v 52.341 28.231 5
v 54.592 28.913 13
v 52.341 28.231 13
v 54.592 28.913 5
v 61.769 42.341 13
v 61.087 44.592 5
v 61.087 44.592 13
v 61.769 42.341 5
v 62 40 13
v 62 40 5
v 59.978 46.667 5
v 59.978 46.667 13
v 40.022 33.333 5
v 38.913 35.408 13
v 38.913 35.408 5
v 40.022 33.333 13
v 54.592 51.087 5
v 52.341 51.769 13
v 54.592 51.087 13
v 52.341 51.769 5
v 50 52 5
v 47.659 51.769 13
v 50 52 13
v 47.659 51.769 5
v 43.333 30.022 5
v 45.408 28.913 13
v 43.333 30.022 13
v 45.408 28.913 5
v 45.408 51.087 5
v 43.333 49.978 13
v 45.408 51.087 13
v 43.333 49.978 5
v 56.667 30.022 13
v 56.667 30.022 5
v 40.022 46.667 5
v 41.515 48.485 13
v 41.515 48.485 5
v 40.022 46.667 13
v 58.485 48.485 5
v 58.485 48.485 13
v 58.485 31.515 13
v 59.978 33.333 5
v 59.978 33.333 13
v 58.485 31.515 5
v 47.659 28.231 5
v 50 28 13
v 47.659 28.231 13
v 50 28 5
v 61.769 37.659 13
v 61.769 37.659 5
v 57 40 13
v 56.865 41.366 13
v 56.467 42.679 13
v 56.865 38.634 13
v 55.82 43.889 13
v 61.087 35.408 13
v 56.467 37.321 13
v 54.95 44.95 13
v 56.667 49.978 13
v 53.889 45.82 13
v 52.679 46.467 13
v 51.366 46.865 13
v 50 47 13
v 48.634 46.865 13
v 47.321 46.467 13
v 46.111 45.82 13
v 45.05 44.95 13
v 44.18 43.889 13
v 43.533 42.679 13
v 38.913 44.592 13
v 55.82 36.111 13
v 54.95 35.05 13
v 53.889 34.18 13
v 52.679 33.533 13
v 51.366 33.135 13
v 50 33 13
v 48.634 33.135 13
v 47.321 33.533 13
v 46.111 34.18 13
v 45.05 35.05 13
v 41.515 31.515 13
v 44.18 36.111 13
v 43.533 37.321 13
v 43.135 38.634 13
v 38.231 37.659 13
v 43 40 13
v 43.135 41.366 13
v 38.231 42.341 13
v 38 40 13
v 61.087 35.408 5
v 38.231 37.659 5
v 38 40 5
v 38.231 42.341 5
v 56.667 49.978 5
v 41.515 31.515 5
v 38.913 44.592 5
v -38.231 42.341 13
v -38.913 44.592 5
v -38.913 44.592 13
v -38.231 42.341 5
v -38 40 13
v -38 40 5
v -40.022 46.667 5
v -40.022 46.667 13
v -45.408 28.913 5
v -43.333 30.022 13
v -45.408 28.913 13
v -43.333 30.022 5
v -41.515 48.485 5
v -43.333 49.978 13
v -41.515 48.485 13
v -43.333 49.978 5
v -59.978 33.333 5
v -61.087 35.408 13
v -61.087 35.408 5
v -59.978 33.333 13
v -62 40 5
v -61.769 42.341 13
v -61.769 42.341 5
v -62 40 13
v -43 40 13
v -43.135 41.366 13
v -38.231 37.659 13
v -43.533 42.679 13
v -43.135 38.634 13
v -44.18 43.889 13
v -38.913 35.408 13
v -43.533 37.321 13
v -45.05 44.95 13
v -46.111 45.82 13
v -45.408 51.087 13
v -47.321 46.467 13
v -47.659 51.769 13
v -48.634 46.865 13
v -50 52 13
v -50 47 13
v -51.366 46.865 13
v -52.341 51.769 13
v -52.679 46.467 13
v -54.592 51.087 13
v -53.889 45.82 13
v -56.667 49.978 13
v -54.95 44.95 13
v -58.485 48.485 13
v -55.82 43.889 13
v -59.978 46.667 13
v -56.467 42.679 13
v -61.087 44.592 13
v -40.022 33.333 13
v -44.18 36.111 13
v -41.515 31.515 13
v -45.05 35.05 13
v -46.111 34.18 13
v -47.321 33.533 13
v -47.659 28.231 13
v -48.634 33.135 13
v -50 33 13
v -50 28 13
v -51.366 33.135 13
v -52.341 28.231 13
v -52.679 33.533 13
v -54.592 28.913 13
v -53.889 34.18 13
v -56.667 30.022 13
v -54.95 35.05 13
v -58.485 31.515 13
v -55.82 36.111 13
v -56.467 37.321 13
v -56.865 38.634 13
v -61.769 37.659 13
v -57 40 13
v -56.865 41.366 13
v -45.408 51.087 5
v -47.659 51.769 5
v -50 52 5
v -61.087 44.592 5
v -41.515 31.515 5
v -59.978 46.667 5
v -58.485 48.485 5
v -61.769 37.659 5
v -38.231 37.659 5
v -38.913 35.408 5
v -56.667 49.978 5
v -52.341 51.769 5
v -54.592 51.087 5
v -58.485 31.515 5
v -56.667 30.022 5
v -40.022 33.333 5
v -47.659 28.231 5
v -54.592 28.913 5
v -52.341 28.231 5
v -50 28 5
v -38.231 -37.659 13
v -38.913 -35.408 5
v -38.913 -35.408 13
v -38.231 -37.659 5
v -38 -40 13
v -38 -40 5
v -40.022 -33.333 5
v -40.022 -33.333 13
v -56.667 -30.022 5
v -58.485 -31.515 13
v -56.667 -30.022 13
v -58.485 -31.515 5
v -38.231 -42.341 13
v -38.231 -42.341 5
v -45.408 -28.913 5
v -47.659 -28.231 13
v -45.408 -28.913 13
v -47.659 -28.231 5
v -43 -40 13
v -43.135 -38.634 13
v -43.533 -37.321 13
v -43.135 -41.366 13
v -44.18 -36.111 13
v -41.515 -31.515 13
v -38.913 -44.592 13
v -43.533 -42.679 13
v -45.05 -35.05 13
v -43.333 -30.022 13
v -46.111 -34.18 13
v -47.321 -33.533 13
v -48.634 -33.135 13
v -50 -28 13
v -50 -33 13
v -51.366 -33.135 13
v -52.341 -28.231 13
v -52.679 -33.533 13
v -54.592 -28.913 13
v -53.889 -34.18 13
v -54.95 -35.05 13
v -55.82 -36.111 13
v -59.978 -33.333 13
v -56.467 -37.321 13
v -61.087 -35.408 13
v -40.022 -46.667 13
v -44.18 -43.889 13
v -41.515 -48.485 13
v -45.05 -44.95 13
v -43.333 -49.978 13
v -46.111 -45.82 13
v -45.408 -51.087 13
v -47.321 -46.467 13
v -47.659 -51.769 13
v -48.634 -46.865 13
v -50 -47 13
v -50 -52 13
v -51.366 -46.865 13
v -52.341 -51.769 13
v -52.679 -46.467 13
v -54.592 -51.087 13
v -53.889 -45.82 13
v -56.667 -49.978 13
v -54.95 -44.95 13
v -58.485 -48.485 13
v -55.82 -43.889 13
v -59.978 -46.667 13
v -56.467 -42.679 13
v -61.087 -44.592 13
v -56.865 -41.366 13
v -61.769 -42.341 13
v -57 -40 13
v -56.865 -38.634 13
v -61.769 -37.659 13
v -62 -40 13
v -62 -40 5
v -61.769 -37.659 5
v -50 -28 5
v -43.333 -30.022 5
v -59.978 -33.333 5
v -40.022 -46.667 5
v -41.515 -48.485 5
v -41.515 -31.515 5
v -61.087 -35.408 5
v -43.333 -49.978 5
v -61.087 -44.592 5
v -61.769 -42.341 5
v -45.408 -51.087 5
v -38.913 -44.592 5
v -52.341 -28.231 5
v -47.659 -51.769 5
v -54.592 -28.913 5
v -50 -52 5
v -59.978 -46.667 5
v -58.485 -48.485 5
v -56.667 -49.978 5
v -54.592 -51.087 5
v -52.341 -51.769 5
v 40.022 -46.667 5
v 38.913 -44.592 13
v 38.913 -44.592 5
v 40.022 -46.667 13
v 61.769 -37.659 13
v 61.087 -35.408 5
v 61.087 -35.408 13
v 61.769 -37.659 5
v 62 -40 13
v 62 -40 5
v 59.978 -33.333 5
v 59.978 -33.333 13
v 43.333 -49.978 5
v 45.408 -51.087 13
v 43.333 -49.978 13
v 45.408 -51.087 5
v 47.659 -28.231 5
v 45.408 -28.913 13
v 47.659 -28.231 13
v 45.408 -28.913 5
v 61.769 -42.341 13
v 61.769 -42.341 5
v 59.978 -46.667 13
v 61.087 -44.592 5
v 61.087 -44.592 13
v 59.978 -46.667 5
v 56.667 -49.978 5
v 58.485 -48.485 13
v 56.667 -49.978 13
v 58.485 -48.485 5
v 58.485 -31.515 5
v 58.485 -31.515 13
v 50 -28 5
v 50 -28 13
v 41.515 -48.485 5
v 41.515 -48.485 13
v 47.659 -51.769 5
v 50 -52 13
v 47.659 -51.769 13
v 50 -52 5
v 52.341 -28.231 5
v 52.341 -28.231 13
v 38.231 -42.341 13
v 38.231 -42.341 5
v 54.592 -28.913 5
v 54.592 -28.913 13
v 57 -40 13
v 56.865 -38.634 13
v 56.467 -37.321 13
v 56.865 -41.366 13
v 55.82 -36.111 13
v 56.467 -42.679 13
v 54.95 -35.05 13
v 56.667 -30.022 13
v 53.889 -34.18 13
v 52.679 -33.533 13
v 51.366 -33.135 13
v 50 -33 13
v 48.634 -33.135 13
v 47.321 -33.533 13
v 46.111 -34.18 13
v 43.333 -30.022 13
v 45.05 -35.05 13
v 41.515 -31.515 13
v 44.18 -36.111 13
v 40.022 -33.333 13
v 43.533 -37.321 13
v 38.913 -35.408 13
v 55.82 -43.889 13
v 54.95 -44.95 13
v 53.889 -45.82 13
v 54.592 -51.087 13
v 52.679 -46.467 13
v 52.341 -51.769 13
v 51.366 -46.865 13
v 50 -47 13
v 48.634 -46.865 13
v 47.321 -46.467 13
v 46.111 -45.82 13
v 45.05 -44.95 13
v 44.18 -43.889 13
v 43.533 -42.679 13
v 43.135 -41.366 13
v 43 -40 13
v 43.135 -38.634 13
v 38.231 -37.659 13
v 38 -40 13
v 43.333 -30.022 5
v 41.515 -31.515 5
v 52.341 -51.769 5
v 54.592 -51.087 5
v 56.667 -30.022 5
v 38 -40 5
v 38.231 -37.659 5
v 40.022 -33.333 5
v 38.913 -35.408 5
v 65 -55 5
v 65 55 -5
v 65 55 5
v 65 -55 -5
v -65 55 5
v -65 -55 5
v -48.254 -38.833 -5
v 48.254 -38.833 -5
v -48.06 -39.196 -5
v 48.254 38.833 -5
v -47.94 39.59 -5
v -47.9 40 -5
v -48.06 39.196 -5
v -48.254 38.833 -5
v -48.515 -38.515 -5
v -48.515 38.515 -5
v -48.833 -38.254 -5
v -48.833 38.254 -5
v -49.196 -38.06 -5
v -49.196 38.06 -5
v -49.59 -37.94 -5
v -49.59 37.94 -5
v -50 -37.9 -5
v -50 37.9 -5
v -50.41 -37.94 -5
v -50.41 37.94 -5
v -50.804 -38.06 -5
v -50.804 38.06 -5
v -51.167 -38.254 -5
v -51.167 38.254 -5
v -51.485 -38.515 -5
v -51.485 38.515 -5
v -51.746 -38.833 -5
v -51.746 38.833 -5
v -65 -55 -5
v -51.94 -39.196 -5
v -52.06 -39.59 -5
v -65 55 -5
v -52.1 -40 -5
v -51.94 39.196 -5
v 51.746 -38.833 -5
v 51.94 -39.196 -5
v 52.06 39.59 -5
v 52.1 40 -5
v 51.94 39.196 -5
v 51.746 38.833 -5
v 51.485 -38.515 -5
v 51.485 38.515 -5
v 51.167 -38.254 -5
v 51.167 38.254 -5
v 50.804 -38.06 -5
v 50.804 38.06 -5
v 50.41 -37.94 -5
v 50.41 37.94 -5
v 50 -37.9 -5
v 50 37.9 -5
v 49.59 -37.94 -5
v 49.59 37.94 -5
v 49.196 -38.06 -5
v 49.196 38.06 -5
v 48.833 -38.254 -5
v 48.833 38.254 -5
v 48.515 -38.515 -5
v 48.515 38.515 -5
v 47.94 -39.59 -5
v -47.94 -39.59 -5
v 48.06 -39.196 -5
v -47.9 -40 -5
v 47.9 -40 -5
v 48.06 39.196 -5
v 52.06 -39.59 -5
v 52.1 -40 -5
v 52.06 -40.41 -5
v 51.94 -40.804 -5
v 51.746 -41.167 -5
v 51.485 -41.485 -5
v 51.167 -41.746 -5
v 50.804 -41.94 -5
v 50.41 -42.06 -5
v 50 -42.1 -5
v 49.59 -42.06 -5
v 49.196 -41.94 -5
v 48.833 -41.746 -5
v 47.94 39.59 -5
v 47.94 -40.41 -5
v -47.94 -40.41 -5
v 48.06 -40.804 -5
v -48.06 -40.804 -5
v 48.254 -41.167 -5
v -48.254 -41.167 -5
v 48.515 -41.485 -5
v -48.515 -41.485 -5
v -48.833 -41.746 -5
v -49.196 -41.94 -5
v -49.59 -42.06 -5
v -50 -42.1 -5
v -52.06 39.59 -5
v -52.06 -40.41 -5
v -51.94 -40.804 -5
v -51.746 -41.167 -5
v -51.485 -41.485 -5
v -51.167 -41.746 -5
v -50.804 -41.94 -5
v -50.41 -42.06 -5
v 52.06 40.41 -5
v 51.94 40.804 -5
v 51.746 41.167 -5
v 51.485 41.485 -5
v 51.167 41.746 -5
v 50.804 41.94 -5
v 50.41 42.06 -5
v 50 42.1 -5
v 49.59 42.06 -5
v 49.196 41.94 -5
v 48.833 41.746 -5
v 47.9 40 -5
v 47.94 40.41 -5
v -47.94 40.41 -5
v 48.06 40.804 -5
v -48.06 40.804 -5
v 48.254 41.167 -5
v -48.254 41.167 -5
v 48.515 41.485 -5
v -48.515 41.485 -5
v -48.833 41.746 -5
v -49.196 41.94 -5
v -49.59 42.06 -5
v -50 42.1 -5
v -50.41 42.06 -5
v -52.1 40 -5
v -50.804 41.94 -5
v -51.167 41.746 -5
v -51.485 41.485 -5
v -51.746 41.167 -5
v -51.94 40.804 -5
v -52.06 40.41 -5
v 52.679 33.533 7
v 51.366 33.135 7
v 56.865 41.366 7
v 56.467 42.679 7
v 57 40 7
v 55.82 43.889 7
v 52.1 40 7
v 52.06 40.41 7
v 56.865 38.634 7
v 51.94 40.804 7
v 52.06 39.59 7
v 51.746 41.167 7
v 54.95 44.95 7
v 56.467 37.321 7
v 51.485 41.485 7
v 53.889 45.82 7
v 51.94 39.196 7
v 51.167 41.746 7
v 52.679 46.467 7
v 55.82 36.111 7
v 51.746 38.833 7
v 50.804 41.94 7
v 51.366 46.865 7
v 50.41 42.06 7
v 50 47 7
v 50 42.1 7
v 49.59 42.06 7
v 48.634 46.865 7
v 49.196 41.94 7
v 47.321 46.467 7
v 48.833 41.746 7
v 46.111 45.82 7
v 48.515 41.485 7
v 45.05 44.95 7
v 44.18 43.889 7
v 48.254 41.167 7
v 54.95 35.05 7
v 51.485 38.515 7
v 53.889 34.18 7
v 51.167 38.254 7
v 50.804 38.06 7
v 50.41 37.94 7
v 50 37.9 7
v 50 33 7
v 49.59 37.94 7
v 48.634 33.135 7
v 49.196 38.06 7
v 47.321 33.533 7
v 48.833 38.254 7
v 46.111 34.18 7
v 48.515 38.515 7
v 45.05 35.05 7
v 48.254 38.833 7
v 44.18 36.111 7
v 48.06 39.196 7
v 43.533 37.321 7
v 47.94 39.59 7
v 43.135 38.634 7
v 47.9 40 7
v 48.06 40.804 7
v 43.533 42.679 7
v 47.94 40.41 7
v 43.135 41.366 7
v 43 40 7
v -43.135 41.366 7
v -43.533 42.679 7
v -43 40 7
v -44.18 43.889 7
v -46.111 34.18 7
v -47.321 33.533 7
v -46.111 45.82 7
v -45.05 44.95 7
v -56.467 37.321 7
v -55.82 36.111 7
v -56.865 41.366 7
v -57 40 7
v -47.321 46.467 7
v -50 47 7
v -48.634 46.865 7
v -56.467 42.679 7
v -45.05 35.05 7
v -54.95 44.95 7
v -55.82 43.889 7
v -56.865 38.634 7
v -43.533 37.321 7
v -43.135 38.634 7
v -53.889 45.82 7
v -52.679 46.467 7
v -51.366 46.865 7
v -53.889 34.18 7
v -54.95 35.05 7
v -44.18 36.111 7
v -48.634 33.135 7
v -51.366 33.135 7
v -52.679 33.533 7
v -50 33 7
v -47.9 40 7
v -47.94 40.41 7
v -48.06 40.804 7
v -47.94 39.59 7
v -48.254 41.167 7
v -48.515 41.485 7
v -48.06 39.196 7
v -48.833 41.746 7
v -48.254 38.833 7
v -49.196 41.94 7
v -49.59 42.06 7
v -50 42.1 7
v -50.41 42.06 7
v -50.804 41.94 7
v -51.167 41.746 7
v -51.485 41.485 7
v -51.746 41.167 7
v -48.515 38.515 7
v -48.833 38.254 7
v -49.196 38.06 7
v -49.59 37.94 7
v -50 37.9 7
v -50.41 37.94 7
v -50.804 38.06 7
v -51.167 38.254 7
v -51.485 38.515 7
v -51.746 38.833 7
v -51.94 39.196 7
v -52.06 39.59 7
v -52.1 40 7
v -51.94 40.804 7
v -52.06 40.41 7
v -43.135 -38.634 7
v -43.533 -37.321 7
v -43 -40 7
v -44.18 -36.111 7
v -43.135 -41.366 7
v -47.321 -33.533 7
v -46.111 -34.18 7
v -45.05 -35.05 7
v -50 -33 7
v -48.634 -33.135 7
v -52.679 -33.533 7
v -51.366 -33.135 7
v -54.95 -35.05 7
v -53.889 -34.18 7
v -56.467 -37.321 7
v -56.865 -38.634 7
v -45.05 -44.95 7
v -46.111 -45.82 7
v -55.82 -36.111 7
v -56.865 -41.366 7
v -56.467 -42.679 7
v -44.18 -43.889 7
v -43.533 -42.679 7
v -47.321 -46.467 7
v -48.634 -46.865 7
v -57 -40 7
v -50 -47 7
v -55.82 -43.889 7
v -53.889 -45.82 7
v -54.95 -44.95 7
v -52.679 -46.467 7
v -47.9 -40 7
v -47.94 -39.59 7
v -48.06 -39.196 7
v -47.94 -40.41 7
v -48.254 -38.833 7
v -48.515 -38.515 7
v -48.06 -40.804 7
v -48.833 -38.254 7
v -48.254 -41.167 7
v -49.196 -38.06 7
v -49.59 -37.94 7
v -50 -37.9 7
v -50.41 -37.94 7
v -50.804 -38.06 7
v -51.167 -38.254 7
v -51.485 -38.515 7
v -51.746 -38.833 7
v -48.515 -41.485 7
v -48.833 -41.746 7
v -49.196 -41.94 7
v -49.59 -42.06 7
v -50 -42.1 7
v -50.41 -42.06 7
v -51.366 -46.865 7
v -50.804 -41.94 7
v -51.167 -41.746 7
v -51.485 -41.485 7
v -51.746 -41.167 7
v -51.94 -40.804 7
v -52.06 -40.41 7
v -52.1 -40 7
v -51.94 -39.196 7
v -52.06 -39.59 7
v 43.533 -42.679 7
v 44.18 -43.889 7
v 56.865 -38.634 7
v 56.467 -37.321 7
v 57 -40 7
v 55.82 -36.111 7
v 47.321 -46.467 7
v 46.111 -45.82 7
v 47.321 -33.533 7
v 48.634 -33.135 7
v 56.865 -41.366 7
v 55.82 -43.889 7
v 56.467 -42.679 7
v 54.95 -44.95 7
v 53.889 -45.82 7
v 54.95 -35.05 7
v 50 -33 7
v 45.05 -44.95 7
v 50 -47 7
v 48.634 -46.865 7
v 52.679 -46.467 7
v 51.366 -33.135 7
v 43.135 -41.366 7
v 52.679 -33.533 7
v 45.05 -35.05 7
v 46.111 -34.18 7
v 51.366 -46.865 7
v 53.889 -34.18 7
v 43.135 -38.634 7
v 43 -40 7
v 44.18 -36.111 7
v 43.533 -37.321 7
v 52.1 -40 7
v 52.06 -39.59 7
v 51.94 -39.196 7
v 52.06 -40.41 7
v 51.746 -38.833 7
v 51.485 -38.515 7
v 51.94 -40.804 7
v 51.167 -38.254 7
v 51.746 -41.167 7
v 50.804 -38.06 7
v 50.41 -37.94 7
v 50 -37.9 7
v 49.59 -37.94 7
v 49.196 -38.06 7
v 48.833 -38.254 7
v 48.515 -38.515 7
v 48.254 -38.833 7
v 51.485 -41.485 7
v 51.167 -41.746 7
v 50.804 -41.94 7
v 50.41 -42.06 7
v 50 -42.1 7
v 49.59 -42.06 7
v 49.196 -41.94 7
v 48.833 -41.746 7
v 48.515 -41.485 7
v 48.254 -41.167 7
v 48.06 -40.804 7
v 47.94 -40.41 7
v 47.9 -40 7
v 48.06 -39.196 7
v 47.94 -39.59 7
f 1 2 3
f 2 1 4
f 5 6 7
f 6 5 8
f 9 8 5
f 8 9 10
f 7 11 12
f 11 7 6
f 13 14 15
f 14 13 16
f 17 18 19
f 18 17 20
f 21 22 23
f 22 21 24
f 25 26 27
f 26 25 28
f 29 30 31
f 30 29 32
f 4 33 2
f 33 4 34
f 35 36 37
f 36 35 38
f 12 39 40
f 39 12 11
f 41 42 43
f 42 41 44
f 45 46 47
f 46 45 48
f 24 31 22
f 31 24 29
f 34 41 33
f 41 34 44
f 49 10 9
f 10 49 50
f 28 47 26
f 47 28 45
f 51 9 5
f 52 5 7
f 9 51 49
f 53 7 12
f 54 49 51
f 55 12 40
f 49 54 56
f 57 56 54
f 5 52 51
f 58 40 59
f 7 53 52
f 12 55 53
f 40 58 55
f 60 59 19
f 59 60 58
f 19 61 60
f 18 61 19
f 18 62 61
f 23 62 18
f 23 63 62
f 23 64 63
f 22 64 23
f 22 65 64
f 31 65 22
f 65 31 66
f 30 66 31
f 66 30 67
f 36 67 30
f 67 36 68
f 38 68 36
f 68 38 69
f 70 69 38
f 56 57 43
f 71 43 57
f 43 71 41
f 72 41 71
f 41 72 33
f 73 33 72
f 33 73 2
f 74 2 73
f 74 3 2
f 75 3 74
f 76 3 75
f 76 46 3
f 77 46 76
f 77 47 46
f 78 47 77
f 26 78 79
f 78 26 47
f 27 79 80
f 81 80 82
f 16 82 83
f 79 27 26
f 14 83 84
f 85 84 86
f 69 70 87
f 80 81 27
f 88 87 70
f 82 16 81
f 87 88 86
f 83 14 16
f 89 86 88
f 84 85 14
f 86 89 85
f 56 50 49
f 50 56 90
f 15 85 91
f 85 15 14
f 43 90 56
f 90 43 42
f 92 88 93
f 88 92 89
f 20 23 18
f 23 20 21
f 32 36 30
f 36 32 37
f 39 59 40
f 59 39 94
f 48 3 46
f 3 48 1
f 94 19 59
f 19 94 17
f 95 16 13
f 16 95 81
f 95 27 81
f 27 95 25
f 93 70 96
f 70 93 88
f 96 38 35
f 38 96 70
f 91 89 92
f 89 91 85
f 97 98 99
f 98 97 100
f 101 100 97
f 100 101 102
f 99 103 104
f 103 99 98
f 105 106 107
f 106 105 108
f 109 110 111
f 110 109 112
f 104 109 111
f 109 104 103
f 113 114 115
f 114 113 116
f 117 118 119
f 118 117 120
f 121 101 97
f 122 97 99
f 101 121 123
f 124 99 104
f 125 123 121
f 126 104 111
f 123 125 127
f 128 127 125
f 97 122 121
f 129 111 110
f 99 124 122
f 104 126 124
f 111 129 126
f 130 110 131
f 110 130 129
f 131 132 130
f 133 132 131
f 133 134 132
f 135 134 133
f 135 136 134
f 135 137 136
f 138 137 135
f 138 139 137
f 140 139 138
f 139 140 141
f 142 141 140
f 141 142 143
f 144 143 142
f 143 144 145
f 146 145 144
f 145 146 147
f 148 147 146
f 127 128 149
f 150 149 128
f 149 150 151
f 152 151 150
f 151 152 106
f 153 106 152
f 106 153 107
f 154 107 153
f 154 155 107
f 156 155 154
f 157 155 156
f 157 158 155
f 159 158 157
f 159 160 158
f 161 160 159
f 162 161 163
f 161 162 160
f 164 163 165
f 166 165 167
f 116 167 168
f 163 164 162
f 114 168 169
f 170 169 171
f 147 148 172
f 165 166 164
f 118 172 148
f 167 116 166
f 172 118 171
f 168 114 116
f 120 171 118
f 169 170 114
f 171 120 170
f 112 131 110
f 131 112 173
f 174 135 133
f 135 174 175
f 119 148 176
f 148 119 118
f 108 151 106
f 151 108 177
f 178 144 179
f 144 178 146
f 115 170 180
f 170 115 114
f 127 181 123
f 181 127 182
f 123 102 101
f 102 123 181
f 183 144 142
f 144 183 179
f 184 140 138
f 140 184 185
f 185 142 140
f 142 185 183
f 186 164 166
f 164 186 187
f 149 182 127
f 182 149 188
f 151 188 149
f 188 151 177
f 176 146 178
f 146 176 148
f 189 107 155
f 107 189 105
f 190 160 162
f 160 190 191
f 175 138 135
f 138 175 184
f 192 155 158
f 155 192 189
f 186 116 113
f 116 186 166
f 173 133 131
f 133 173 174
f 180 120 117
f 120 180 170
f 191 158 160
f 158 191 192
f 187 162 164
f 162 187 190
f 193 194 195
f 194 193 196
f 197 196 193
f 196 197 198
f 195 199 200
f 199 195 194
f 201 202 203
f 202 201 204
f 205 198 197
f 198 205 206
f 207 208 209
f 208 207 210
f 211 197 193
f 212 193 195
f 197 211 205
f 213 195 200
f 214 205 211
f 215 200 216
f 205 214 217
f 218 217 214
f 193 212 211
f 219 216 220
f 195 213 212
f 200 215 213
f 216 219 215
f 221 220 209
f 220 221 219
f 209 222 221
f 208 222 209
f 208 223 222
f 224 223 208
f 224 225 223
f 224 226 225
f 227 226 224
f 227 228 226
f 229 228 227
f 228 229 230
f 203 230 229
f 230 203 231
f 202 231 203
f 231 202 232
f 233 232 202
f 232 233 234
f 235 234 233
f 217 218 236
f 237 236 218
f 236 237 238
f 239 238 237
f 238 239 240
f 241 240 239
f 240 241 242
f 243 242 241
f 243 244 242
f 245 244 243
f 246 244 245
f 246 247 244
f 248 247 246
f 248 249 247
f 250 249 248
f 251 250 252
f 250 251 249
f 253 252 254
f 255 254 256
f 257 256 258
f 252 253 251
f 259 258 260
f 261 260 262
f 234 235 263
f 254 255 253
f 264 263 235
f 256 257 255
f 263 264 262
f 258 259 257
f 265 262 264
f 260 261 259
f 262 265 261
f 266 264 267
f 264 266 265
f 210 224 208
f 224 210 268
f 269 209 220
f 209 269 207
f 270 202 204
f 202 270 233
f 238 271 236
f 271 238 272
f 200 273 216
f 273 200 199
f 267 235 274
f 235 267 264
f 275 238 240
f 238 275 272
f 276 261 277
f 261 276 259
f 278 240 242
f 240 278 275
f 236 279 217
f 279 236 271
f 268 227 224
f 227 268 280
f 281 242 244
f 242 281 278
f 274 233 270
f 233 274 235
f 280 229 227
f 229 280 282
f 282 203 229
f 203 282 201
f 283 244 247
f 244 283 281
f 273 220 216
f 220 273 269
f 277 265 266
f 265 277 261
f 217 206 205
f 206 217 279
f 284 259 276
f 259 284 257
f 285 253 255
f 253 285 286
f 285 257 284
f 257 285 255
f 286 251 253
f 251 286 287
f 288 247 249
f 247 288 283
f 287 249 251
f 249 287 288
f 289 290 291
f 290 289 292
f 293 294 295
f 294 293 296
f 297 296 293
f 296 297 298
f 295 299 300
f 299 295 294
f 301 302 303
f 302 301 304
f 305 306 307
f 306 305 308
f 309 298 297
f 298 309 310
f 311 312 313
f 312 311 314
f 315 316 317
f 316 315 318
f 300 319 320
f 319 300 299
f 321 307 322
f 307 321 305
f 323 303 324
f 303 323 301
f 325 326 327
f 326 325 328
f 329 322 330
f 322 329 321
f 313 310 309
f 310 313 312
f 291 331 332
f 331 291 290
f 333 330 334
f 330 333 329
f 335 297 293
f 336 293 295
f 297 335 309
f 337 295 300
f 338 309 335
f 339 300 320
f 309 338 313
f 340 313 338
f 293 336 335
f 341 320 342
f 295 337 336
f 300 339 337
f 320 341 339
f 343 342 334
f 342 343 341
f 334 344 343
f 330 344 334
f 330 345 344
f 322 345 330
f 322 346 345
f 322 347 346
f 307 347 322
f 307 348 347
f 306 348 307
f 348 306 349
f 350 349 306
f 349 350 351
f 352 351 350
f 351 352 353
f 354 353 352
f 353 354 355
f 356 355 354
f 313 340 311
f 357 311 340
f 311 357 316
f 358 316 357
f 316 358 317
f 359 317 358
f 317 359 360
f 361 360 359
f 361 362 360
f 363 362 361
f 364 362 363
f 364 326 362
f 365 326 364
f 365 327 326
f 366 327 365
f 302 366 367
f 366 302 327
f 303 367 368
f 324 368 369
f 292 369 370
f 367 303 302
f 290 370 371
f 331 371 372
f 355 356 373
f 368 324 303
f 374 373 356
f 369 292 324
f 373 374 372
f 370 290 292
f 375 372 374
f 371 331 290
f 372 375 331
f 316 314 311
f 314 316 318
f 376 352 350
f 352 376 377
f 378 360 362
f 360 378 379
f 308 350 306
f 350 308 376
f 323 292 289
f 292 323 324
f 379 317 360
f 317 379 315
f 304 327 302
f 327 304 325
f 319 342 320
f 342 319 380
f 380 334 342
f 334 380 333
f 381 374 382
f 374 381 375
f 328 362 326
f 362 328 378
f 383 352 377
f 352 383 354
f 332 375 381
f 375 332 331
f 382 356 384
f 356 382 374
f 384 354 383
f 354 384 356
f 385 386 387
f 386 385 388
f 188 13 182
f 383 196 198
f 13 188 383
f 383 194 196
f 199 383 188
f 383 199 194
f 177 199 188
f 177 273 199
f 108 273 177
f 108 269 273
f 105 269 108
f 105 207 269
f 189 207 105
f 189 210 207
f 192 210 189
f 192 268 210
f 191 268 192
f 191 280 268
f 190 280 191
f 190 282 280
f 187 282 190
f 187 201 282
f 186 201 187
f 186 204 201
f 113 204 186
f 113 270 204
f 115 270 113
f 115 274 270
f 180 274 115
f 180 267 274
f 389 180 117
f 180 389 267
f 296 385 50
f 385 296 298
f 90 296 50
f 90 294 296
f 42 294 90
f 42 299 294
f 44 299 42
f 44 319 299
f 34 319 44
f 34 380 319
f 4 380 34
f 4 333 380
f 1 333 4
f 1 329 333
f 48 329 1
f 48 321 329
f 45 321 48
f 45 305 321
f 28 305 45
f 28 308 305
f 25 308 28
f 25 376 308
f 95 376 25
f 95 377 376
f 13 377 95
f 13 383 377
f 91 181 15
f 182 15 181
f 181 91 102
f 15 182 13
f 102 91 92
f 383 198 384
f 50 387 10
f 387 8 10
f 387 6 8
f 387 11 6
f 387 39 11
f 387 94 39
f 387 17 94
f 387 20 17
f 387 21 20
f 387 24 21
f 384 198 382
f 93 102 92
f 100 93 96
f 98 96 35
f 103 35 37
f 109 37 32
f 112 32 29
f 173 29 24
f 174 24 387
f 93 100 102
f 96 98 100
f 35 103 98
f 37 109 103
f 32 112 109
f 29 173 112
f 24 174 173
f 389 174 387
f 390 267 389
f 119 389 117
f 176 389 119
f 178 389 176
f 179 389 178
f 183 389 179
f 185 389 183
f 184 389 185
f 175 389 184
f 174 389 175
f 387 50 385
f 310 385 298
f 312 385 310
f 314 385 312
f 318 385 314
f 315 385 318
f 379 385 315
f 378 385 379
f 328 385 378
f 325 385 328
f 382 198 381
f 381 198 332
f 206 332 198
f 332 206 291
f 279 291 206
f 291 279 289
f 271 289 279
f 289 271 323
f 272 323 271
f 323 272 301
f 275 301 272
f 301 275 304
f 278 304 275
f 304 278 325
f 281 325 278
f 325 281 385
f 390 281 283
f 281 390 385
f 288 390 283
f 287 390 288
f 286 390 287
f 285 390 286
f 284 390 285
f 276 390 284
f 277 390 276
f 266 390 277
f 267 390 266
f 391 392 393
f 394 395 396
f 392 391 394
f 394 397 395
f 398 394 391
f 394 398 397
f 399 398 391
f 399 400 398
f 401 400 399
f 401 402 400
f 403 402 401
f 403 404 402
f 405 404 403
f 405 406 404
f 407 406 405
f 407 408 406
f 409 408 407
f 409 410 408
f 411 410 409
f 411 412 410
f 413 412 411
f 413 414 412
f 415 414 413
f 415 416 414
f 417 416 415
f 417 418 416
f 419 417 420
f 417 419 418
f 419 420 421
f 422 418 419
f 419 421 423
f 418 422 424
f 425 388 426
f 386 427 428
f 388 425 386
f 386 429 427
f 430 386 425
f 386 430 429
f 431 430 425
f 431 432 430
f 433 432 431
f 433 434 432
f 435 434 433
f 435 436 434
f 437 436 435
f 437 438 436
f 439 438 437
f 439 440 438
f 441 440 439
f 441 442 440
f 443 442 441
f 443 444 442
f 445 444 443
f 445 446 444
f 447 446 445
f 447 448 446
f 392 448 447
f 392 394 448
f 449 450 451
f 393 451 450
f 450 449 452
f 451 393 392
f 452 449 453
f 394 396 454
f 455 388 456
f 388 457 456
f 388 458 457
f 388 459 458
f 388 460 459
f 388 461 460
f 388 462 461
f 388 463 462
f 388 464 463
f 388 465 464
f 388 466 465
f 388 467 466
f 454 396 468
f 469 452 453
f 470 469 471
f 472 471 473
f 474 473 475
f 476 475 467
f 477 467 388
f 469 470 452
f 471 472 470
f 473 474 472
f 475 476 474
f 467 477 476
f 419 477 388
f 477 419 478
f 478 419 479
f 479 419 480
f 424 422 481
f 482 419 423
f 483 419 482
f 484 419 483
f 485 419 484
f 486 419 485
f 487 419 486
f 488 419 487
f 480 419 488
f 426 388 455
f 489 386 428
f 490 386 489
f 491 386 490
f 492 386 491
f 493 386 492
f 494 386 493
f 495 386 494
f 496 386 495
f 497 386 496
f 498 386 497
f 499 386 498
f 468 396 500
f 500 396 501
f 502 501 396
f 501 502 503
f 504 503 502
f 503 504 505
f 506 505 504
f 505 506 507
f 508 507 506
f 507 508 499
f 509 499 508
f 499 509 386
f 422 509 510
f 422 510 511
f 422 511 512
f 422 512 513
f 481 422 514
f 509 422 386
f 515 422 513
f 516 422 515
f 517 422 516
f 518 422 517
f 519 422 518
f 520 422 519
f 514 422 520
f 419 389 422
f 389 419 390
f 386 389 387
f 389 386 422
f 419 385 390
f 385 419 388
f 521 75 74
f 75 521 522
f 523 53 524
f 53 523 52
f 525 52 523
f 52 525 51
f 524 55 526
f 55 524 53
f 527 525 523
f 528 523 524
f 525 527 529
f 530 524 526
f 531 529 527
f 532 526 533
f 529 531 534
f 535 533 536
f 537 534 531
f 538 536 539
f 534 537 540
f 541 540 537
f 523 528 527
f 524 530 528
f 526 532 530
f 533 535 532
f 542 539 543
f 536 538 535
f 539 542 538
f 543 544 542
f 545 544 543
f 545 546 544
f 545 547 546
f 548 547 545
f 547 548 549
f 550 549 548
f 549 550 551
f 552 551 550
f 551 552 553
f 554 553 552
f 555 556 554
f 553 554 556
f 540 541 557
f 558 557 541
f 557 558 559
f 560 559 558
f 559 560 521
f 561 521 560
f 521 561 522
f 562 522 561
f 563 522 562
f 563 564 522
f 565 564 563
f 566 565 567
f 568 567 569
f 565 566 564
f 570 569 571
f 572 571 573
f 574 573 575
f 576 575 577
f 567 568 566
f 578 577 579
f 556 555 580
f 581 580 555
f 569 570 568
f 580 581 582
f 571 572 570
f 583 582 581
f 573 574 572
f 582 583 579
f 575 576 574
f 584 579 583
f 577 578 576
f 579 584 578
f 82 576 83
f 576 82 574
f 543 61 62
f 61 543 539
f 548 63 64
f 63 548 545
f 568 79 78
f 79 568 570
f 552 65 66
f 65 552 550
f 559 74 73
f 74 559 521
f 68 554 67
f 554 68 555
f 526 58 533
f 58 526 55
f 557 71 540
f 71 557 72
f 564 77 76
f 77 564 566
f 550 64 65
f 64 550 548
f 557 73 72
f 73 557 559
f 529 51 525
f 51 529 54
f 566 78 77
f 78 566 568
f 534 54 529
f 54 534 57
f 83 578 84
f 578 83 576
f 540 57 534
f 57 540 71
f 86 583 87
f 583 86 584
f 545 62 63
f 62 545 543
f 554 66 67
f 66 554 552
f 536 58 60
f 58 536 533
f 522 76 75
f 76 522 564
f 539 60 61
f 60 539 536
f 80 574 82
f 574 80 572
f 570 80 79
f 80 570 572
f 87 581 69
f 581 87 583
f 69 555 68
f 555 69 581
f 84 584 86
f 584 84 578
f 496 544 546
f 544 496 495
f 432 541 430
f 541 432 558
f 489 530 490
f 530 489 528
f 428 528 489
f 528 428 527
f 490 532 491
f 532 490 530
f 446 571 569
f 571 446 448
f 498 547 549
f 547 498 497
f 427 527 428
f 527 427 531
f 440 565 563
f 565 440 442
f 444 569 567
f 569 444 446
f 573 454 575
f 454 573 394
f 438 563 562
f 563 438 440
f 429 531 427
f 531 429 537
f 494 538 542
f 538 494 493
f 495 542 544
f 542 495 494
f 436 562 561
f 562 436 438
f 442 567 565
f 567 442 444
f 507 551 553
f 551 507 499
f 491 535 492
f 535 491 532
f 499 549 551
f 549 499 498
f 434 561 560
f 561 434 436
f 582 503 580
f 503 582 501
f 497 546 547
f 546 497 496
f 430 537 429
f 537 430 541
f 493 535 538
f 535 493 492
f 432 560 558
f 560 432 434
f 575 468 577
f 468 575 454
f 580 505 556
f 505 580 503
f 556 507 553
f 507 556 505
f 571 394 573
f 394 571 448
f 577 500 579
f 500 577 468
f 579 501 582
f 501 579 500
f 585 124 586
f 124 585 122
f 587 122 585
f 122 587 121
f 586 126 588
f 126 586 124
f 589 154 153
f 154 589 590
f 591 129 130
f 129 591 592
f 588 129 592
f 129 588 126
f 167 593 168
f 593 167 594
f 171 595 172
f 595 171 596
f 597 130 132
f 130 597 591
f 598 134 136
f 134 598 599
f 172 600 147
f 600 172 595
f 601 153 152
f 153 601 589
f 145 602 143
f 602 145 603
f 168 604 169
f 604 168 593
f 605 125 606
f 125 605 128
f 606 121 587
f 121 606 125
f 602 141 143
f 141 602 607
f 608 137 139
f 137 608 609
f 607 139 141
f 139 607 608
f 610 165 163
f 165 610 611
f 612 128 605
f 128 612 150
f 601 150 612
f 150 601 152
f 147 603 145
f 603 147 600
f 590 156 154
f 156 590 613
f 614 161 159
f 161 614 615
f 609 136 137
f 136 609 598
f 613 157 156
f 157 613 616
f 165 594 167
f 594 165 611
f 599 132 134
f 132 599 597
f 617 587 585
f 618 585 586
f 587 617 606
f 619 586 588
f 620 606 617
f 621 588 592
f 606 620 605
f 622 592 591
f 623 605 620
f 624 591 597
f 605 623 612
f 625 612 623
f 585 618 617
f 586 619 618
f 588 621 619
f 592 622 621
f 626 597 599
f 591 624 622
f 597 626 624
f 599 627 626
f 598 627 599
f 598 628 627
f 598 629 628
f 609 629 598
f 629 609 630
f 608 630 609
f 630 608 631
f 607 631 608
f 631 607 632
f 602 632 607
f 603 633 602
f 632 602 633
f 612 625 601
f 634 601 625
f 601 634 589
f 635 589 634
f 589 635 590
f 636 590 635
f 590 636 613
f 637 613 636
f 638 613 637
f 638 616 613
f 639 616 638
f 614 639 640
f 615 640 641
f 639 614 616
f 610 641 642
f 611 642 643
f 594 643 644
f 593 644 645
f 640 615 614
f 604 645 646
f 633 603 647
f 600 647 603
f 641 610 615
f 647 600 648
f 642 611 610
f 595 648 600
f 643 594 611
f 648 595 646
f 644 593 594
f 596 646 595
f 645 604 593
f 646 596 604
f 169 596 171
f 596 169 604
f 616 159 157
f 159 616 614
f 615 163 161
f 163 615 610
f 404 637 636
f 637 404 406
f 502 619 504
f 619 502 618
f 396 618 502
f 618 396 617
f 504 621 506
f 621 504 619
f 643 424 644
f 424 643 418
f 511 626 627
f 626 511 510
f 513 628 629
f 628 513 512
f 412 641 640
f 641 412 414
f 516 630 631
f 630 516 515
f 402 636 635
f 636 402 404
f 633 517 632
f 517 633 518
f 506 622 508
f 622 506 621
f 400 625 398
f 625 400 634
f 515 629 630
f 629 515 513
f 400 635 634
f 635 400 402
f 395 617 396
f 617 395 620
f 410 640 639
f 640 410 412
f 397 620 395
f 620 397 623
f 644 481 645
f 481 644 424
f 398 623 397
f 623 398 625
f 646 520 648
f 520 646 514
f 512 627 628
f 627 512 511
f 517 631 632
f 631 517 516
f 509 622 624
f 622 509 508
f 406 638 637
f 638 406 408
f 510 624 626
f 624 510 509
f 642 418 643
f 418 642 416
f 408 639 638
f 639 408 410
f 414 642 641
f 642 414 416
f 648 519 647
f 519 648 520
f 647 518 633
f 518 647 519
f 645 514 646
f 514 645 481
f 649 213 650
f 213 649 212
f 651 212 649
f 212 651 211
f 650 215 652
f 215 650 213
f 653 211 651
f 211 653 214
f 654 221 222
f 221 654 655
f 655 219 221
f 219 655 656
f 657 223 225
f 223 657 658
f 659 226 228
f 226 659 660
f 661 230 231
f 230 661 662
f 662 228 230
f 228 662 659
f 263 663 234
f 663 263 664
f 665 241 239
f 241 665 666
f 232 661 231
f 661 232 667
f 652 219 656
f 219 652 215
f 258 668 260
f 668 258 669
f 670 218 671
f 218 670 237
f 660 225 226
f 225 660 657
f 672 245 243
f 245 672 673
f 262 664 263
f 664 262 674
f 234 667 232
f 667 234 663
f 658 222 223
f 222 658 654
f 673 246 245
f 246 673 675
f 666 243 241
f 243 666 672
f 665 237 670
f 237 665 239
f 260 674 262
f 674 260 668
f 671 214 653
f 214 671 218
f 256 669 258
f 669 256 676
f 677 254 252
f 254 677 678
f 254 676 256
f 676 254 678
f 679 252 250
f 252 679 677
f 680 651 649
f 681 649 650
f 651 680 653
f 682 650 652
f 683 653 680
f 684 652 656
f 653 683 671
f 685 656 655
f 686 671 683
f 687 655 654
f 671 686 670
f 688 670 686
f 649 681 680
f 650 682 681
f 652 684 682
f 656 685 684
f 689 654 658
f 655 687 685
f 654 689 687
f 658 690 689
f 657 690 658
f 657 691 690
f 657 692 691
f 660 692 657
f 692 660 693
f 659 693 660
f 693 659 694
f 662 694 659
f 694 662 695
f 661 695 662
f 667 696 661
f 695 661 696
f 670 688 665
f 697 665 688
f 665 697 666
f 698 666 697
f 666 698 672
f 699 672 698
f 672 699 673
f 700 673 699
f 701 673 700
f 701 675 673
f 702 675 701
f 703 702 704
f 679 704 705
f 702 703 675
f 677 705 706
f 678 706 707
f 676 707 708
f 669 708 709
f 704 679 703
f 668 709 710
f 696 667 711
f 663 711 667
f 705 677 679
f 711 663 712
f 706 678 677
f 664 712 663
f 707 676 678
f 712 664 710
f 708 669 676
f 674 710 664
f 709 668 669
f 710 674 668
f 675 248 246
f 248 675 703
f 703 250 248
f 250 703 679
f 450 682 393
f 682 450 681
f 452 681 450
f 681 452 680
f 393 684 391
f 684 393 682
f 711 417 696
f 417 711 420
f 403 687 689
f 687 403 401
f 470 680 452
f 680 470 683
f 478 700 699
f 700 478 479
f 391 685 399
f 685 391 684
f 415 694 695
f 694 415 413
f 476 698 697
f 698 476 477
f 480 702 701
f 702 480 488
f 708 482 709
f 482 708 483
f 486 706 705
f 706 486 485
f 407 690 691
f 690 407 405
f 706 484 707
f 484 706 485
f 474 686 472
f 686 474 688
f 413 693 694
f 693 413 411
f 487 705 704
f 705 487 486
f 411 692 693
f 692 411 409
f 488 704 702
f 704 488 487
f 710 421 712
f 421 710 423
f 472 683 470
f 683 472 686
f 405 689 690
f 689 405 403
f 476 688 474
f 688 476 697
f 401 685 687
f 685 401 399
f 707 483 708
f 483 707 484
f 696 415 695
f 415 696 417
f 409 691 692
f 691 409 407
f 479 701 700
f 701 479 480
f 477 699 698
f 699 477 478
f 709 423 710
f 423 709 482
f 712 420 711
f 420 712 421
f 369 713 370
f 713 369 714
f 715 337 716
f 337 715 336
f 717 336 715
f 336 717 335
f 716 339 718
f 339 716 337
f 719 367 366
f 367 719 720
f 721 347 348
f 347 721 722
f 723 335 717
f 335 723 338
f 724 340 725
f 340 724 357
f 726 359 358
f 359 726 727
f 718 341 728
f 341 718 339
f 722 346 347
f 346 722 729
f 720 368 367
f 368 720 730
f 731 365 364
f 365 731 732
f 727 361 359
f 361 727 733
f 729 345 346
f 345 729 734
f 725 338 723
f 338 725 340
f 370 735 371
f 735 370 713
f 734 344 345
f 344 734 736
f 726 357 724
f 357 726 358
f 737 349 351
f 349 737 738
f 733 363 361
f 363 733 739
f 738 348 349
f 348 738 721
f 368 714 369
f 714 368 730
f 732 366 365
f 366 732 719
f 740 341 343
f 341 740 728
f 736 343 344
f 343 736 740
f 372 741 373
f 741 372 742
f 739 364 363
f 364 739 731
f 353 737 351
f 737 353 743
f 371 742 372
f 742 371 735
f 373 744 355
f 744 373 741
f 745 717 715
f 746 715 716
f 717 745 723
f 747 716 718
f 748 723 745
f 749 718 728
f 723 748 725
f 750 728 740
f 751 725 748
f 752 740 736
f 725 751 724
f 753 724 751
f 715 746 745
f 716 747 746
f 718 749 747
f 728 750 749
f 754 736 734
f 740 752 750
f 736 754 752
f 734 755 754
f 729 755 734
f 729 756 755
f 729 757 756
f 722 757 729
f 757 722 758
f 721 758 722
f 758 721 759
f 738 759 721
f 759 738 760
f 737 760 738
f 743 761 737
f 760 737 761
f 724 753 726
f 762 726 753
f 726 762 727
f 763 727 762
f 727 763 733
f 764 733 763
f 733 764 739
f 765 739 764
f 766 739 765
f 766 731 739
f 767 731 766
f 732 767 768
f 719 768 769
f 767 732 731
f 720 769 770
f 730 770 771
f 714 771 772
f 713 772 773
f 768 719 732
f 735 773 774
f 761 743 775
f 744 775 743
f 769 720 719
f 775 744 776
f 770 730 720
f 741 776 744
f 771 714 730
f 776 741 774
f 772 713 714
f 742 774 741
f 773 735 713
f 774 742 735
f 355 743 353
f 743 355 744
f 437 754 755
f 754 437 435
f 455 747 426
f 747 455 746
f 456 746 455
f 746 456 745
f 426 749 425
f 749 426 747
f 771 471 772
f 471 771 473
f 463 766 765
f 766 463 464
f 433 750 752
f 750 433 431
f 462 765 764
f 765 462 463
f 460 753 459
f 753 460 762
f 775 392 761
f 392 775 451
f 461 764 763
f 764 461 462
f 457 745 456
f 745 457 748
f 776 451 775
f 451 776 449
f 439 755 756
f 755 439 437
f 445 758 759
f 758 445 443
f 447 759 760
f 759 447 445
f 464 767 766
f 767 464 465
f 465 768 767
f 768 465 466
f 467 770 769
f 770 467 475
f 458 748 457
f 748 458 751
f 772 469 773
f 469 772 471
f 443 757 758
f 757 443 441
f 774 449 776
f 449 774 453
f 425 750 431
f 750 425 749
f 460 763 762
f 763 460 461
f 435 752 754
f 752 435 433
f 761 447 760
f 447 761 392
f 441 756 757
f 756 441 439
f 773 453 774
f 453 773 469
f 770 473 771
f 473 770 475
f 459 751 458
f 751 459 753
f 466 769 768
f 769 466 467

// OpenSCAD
$fn = 32;

// ----------------------------------------------------------------------
// Socket pad plate
// bosses with counterbored sockets for the screws
// ----------------------------------------------------------------------

// --- parameters (mm) ---
base_t = 10;             // base plate thickness
boss_h = 8;              // boss height above the base plate
boss_d = 24;             // boss diameter
socket_d = 14;           // socket diameter
socket_depth = 6;        // socket depth from the boss face
bolt_d = 4.2;            // screw clearance hole through the socket floor
plate = [130, 110, 10];  // overall size (x, y, z)
edge = 15;               // boss centre offset from the plate edge
pads = 4;                // boss count, one per corner

// --- derived feature positions (mm) ---
height = base_t + boss_h;        // = 18   overall height of the part
corner_x = plate[0] / 2 - edge;  // = 50   boss centre X
corner_y = plate[1] / 2 - edge;  // = 40   boss centre Y
feature_centers = [
  [corner_x, corner_y],
  [-corner_x, corner_y],
  [-corner_x, -corner_y],
  [corner_x, -corner_y]
];   // boss centres: sockets, holes and the pads themselves are placed from here

// base plate, bosses on feature_centers, socket + through hole in each
difference() {
  union() {
    cube(plate, center = true);
    for (centre = feature_centers)
      translate([centre[0], centre[1], plate[2] / 2 - 1])
        cylinder(d = boss_d, h = boss_h + 1);
  }
  for (centre = feature_centers) {
    translate([centre[0], centre[1], plate[2] / 2 + boss_h - socket_depth])
      cylinder(d = socket_d, h = socket_depth + 1);
    translate([centre[0], centre[1], -height])
      cylinder(d = bolt_d, h = 2 * height + 2);  // through the socket floor
  }
}
